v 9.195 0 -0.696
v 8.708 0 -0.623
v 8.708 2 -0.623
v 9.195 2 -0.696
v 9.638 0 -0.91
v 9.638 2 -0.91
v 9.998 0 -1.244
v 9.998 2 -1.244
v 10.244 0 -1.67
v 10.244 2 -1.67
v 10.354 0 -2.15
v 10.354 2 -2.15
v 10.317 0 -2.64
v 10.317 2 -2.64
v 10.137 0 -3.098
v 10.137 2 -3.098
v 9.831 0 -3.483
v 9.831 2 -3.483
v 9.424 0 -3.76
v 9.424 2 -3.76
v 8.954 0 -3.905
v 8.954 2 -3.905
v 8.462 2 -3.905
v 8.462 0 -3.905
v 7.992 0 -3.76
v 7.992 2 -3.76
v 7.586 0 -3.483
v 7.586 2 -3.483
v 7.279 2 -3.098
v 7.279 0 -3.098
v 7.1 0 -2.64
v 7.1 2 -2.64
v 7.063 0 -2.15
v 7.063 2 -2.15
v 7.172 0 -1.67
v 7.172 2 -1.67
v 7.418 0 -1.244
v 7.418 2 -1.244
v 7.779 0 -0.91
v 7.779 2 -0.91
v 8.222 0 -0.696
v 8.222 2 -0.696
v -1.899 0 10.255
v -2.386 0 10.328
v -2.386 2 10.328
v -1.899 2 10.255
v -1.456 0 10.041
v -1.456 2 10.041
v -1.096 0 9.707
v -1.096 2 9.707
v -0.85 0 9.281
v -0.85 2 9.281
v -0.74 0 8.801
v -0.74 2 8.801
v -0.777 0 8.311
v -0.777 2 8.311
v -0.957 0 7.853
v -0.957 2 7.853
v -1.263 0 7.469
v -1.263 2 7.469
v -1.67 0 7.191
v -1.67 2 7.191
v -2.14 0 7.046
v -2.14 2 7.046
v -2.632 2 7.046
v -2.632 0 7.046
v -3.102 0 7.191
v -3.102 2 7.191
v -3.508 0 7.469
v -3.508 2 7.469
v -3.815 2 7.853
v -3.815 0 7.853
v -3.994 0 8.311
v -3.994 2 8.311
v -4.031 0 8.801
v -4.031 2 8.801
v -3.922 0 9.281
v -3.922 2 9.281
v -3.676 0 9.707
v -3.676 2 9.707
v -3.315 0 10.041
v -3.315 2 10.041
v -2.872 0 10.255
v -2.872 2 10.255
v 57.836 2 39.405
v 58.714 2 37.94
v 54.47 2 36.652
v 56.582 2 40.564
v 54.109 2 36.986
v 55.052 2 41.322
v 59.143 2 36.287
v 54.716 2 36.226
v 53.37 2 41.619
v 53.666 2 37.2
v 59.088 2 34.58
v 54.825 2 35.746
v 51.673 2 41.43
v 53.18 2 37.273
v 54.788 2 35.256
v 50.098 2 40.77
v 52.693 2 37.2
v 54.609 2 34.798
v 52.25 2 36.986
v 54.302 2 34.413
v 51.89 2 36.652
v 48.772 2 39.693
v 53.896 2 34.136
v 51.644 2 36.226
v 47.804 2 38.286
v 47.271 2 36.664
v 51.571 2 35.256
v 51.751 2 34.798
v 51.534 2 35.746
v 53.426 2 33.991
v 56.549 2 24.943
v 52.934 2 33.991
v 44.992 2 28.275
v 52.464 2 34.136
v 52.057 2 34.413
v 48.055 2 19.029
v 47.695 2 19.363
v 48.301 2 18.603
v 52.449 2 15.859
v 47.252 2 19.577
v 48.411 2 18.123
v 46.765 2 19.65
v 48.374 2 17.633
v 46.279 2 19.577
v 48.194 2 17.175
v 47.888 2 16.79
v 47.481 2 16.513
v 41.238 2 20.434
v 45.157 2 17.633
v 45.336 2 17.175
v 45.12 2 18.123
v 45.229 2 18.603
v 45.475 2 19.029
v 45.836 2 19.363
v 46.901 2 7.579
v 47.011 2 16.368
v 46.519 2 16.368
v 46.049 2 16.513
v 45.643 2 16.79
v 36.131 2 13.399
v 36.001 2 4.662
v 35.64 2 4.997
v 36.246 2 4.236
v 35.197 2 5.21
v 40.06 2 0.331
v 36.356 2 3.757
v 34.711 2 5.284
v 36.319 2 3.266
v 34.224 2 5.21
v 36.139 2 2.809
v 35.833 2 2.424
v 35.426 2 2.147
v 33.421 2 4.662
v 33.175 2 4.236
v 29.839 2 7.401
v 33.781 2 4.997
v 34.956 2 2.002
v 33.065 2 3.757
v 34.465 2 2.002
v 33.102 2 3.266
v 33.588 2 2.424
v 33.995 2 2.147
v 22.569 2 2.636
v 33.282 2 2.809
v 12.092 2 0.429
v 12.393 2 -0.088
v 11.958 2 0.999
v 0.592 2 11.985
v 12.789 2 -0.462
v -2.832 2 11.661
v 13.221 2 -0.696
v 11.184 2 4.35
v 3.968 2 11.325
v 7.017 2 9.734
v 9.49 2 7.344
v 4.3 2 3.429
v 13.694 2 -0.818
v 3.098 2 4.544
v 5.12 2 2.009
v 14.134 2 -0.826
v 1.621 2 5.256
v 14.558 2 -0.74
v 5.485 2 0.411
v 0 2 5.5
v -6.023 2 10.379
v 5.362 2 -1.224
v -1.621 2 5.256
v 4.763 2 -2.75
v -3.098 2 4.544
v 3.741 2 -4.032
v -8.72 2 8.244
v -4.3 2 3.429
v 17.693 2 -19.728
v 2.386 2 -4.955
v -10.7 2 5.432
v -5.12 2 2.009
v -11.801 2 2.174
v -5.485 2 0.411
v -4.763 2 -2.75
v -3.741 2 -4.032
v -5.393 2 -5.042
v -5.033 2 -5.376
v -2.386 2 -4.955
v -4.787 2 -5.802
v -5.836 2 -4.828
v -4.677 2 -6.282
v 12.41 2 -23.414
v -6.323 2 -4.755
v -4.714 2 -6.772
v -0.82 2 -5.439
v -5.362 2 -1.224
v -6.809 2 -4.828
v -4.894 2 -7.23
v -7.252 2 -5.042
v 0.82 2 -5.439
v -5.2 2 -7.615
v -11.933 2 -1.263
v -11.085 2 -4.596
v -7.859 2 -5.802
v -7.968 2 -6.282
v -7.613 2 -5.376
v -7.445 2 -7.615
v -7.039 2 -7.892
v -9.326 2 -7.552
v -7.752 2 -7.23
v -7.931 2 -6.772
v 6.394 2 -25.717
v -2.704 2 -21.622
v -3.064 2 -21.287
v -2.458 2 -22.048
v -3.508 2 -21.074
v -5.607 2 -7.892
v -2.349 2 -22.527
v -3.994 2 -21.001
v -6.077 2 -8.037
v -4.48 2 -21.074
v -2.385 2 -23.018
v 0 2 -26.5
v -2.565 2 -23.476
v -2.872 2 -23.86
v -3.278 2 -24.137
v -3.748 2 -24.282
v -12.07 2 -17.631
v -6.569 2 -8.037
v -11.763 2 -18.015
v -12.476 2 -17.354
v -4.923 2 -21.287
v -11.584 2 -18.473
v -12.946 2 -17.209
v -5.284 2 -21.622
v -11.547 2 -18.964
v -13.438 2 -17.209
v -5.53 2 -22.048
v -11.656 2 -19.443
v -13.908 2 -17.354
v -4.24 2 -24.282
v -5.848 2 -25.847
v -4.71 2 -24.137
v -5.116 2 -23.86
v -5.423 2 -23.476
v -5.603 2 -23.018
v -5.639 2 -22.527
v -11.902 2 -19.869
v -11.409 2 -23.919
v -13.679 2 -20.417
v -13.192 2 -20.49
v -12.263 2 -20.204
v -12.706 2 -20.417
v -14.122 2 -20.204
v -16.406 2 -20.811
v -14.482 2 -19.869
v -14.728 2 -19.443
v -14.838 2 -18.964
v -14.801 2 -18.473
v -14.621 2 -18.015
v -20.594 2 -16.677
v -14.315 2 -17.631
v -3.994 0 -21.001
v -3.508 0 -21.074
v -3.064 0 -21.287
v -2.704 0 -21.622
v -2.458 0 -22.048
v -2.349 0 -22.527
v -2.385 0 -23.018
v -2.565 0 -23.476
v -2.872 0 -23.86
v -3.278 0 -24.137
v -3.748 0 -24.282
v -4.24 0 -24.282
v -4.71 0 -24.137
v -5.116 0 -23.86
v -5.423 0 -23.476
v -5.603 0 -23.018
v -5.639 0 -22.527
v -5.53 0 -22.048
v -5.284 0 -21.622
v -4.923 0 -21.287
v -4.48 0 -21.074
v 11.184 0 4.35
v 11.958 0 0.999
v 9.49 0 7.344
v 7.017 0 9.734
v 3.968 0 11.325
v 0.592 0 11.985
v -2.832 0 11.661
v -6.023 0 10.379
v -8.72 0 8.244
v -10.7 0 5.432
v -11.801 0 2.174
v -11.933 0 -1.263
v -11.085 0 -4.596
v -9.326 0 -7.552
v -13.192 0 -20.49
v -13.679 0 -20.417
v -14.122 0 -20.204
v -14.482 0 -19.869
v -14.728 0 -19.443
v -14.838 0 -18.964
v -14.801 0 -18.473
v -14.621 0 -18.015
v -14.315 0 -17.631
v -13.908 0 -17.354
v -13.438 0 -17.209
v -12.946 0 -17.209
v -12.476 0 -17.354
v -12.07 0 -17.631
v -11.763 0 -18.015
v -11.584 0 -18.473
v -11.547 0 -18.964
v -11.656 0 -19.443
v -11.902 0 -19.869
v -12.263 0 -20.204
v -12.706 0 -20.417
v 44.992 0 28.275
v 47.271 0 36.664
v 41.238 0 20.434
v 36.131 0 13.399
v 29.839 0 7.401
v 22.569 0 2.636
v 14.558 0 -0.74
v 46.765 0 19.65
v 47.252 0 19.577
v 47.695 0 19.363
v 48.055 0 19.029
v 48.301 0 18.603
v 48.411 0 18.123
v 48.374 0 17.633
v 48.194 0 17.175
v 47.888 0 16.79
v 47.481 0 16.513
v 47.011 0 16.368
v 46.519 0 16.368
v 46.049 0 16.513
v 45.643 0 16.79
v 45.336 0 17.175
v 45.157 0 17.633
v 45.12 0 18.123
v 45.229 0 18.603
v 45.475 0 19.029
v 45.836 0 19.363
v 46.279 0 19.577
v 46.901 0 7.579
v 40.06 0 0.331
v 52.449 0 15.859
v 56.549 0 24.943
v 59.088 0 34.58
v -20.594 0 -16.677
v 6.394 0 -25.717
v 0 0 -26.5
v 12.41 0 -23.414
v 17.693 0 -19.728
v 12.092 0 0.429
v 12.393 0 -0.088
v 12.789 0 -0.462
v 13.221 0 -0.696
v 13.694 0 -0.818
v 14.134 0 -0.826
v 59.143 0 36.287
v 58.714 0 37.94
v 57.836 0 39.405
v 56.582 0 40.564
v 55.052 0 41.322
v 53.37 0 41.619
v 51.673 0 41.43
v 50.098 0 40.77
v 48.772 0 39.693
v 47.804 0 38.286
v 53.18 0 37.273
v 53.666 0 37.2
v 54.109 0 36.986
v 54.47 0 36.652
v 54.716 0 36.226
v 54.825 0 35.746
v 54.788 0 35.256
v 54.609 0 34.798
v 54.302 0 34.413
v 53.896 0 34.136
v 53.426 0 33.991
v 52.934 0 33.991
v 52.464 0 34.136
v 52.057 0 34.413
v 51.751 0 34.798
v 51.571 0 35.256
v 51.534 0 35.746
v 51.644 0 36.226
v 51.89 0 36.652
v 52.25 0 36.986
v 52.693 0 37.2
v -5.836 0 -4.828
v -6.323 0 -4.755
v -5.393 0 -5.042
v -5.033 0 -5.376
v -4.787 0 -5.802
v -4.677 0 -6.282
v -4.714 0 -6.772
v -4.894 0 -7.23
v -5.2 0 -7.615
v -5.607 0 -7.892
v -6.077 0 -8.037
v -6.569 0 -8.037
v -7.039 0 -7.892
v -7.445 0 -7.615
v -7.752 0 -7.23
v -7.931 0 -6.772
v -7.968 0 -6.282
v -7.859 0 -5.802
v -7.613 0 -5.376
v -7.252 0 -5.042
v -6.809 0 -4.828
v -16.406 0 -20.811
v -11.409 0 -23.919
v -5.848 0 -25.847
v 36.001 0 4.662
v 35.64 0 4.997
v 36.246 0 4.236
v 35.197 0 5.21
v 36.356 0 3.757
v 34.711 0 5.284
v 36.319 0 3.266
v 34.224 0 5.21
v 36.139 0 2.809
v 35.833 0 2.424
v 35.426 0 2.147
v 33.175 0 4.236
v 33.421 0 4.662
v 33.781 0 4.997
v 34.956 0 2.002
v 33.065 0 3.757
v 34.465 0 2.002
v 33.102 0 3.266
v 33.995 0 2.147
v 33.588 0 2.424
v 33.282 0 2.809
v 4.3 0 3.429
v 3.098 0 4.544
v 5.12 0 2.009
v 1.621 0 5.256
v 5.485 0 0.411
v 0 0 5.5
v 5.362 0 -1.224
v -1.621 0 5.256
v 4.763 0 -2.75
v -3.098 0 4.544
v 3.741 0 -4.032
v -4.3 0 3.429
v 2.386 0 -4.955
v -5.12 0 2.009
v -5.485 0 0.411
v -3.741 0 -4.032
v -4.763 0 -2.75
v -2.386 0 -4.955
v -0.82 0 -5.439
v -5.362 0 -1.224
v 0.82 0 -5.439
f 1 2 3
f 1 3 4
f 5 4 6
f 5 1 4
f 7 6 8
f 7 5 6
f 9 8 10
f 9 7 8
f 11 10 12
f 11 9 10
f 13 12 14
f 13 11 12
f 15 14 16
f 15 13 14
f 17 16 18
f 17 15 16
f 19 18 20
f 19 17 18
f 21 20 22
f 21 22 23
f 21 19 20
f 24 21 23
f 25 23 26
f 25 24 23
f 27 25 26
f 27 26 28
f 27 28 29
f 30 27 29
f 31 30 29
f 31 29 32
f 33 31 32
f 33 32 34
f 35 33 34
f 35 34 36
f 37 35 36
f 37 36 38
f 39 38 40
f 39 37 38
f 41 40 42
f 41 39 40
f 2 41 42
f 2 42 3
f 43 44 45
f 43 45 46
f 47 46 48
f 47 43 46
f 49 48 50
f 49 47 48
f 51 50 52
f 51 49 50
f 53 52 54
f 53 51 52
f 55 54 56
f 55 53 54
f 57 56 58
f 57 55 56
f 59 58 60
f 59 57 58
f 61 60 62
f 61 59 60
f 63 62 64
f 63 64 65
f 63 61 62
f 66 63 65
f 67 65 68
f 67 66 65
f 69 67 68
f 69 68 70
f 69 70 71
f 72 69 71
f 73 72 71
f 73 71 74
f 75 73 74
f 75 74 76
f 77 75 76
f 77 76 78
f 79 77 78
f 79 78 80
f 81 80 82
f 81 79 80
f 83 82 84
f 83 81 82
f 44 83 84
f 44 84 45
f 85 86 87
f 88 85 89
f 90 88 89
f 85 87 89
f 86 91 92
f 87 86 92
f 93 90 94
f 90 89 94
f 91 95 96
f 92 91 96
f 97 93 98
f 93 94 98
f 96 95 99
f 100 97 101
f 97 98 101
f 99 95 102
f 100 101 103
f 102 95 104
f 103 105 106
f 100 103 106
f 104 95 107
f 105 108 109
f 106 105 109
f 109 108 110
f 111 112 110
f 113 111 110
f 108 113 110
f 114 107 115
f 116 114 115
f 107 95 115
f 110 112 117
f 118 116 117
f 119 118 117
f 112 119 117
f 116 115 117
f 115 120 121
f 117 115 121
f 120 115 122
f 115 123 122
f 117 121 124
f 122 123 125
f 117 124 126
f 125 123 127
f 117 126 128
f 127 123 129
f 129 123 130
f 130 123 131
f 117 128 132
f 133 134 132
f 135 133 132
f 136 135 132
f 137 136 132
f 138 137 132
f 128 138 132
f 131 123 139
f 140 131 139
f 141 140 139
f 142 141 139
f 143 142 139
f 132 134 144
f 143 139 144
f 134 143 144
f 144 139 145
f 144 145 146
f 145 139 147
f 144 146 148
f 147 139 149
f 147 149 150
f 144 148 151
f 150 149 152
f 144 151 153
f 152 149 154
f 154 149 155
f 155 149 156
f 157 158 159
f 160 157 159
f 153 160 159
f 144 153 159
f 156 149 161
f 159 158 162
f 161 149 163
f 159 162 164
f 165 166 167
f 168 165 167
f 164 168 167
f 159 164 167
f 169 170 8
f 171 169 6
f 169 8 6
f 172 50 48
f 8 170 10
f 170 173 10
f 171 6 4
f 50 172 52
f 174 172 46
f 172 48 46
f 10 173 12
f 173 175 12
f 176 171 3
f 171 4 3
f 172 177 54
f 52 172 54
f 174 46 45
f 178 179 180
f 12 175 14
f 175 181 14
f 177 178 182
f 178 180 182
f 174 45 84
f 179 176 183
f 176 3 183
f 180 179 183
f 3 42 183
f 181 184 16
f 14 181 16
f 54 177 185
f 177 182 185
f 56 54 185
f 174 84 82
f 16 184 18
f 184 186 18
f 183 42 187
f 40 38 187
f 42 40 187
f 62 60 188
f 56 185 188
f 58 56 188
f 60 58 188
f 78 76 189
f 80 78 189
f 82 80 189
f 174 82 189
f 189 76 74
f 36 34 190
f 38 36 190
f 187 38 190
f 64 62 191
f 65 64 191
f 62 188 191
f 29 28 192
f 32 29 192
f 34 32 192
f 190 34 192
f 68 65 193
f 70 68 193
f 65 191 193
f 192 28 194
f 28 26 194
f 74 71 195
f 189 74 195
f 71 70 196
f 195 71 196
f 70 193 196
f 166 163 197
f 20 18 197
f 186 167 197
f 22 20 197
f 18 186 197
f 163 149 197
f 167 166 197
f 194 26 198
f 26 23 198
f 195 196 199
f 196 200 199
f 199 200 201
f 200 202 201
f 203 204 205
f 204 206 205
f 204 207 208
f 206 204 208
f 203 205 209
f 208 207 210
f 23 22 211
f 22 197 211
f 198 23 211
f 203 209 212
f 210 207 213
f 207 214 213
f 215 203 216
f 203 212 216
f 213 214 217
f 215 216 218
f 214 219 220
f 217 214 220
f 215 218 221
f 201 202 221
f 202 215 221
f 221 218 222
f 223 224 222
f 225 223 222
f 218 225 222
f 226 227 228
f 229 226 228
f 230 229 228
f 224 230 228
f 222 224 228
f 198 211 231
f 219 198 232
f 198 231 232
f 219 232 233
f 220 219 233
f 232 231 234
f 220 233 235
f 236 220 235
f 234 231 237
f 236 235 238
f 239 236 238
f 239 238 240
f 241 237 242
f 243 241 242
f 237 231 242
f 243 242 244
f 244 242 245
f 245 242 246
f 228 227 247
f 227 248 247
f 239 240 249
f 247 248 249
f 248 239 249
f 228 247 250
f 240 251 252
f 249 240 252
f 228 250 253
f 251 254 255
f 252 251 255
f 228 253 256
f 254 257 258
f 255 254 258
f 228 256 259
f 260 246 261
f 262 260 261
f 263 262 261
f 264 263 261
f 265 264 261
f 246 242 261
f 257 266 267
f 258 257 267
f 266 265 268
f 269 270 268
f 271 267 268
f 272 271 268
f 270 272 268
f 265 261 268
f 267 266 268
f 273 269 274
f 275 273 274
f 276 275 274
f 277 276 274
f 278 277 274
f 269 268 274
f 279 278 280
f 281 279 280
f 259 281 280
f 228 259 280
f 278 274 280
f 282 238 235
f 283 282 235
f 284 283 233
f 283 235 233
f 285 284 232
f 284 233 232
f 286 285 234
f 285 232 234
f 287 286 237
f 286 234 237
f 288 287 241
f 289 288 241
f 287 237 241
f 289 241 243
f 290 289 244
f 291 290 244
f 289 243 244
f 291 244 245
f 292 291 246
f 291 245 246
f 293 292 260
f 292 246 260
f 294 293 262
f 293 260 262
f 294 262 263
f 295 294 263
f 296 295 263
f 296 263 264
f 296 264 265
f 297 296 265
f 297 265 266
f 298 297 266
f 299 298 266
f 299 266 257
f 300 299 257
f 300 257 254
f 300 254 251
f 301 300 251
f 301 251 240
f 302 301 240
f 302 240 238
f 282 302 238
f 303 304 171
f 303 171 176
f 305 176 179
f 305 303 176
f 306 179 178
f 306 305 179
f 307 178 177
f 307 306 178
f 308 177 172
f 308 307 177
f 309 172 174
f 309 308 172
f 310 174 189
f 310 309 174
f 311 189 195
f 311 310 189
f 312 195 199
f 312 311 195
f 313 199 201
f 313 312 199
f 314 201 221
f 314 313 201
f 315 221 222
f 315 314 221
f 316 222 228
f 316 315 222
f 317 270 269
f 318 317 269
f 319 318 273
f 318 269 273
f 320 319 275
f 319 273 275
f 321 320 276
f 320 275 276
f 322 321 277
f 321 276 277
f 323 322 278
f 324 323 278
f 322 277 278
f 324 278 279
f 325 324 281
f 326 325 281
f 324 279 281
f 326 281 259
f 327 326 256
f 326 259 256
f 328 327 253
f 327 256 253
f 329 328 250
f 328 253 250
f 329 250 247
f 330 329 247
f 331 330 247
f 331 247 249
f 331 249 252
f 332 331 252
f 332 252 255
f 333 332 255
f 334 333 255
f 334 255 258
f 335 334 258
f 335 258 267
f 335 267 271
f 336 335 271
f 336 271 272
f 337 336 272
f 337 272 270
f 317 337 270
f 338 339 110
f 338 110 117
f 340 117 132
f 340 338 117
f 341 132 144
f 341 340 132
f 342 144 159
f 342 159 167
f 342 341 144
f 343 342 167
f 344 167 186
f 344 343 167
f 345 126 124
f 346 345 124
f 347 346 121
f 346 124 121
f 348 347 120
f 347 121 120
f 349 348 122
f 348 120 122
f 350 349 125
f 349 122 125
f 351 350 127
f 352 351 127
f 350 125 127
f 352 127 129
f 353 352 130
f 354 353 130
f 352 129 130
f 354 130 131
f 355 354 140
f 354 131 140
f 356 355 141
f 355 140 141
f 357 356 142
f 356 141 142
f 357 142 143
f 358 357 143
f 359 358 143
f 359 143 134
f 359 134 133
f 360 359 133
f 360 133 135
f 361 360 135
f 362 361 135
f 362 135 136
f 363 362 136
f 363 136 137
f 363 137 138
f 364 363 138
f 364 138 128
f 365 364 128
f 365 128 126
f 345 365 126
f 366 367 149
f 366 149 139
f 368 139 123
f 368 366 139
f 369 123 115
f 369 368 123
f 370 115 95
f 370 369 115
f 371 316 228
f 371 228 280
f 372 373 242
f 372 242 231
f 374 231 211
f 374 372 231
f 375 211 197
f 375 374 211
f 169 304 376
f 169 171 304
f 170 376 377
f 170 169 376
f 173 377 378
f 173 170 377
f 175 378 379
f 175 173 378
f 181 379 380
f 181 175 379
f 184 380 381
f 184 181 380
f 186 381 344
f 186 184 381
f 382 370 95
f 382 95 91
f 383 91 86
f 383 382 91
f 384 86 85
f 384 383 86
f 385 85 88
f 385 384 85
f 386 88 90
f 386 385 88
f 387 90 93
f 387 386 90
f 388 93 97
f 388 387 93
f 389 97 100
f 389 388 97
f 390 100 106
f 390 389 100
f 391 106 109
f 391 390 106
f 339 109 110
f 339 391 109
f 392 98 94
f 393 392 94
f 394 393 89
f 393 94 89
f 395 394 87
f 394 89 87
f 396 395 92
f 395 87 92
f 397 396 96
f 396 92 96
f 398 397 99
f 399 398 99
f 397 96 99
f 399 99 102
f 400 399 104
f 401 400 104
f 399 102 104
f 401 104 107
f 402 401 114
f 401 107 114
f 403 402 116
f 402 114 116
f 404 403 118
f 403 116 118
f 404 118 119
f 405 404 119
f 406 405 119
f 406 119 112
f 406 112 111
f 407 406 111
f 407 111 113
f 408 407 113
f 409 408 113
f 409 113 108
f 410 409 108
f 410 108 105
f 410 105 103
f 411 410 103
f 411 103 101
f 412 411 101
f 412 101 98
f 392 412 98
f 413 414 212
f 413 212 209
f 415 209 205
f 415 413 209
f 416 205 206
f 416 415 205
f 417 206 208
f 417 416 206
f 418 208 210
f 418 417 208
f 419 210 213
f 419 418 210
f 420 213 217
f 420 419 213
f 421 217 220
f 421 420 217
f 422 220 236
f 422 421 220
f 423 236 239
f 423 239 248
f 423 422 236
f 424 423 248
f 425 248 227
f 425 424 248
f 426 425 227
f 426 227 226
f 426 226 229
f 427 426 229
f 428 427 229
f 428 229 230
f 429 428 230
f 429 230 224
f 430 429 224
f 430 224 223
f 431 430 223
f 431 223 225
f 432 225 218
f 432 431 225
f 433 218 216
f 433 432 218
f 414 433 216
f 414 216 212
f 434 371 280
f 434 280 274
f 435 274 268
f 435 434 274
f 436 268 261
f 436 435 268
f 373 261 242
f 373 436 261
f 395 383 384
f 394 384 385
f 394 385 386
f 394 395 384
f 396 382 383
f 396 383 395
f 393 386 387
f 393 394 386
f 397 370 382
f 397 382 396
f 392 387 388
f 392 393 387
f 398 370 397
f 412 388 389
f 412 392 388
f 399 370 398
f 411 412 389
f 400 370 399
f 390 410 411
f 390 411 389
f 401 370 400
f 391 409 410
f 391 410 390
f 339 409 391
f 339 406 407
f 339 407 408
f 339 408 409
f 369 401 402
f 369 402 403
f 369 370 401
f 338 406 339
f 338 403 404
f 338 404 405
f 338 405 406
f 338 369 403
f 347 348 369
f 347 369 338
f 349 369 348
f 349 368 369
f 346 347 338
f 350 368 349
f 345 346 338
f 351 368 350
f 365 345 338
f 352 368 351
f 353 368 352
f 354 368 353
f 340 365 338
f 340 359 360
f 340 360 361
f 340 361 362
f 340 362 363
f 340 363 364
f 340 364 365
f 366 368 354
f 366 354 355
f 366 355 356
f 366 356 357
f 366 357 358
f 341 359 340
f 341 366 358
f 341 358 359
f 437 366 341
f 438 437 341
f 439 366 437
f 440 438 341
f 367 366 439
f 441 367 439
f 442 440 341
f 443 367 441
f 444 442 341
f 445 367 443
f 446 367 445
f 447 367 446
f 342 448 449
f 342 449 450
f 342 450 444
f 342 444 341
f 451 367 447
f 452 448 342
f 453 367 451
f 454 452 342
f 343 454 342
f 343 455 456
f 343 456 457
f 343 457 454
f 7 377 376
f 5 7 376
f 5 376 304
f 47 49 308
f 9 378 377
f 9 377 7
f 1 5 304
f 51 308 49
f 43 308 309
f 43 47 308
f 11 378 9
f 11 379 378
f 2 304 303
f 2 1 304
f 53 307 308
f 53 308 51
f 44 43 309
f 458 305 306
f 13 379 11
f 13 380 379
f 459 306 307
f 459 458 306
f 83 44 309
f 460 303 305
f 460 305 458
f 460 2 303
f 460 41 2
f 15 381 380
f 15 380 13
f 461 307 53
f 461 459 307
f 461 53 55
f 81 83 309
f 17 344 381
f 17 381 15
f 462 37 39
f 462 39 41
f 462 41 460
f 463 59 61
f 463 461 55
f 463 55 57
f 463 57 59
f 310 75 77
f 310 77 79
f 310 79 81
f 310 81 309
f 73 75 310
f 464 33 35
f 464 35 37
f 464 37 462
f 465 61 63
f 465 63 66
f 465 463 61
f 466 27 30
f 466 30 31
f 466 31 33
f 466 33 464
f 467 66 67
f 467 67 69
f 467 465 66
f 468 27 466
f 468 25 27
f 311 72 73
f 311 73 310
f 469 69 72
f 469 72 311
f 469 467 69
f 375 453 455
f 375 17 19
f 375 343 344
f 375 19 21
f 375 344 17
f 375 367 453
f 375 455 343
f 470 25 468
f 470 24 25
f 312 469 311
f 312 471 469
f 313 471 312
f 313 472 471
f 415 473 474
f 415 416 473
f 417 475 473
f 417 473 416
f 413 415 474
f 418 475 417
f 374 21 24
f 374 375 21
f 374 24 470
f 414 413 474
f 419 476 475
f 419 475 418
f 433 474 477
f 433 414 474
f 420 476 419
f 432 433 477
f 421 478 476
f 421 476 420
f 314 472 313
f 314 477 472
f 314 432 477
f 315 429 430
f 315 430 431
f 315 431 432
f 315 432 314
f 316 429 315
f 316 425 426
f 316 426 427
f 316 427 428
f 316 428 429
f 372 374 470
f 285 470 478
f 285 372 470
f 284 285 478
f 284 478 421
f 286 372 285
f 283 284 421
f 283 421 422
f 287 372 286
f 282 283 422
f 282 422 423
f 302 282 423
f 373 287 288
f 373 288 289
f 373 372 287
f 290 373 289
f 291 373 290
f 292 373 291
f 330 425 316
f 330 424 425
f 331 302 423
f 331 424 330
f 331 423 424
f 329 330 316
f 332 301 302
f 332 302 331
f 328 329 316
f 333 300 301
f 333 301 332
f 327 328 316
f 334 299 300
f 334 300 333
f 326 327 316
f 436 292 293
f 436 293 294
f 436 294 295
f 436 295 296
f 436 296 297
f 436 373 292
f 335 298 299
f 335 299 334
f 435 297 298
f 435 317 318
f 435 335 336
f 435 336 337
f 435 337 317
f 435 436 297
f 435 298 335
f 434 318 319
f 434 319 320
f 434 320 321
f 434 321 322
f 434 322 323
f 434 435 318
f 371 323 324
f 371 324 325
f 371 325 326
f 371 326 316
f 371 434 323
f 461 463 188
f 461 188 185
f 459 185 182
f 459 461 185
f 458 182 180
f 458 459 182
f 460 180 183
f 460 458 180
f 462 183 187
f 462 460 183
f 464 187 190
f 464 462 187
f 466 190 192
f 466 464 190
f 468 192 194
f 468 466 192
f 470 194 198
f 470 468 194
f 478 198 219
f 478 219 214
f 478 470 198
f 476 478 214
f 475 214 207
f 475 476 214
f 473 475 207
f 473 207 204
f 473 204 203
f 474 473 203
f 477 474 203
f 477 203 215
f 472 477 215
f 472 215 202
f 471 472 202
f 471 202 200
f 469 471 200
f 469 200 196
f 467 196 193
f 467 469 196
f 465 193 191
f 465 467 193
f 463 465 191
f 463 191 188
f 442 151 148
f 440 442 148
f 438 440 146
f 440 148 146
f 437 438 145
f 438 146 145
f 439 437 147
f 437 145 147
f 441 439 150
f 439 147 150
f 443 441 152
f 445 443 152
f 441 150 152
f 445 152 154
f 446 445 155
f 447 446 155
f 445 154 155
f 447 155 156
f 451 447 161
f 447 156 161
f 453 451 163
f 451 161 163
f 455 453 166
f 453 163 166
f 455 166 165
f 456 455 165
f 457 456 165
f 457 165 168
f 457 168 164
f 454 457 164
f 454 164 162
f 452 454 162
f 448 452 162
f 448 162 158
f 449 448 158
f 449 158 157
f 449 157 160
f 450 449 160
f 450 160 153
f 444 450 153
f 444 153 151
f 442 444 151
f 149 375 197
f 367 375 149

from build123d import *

# Parameters (mm, degrees)
SKETCH_1_R          = 1.65
SKETCH_1_R_2        = 5.5
EXTRUDE_1_DEPTH     = 2
SKETCH_2_R          = 1.65
CUT_EXTRUDE_2_DEPTH = 73.378330115
FILLET_1_R          = 2


with BuildPart() as part:
    # Эскиз1 → Бобышка-Вытянуть1 (new body)
    with BuildSketch(Plane(origin=(0, 0, 0), x_dir=(1, 0, 0), z_dir=(0, 1, 0))):
        with BuildLine():
            Line((-9.325751537, 7.551844693), (-20.594367979, 16.676990363))
            ThreePointArc((-20.594367979, 16.676990363), (-11.408544065, 23.918510035), (0, 26.5))
            ThreePointArc((0, 26.5), (9.472405203, 24.74921291), (17.693175332, 19.728191673))
            Line((17.693175332, 19.728191673), (40.060019619, -0.331452118))
            ThreePointArc((40.060019619, -0.331452118), (52.448537608, -15.858861968), (59.088465181, -34.580165246))
            ThreePointArc((59.088465181, -34.580165246), (54.221507729, -41.53090083), (47.270772145, -36.663943378))
            ThreePointArc((47.270772145, -36.663943378), (35.208034426, -12.373999402), (11.905757948, 1.500975575))
            ThreePointArc((11.905757948, 1.500975575), (-3.288975911, -11.540478216), (-9.325751537, 7.551844693))
        make_face()
        with Locations(Location((-6.322604321, 6.40505071, 0), (0, 0, 270))):
            Circle(SKETCH_1_R, mode=Mode.SUBTRACT)
        with Locations(Location((0, 0, 0), (0, 0, 270))):
            Circle(SKETCH_1_R_2, mode=Mode.SUBTRACT)
        with Locations(Location((8.708238788, 2.273010605, 0), (0, 0, 270))):
            Circle(SKETCH_1_R, mode=Mode.SUBTRACT)
        with Locations(Location((-2.385634467, -8.678061315, 0), (0, 0, 270))):
            Circle(SKETCH_1_R, mode=Mode.SUBTRACT)
    extrude(amount=EXTRUDE_1_DEPTH)

    # Эскиз2 → Вырез-Вытянуть2 (cut, through all)
    with BuildSketch(Plane(origin=(0, 2, 0), x_dir=(1, 0, 0), z_dir=(0, 1, 0))):
        with Locations(Location((-3.993908086, 22.650578319, 0), (0, 0, 270))):
            Circle(SKETCH_2_R)
        with Locations(Location((-13.192258036, 18.840497019, 0), (0, 0, 90))):
            Circle(SKETCH_2_R)
        with Locations(Location((46.765371804, -18, 0), (0, 0, 270))):
            Circle(SKETCH_2_R)
        with Locations(Location((53.179618663, -35.622998406, 0), (0, 0, 270))):
            Circle(SKETCH_2_R)
        with Locations(Location((34.710530923, -3.633600072, 0), (0, 0, 270))):
            Circle(SKETCH_2_R)
    extrude(amount=-CUT_EXTRUDE_2_DEPTH, mode=Mode.SUBTRACT)

    # Скругление1
    fillet_1_edges = [part.edges().sort_by_distance(p)[0] for p in [
        (11.905757948, 1, -1.500975575),
    ]]
    fillet(fillet_1_edges, radius=FILLET_1_R)


solid = part.part
